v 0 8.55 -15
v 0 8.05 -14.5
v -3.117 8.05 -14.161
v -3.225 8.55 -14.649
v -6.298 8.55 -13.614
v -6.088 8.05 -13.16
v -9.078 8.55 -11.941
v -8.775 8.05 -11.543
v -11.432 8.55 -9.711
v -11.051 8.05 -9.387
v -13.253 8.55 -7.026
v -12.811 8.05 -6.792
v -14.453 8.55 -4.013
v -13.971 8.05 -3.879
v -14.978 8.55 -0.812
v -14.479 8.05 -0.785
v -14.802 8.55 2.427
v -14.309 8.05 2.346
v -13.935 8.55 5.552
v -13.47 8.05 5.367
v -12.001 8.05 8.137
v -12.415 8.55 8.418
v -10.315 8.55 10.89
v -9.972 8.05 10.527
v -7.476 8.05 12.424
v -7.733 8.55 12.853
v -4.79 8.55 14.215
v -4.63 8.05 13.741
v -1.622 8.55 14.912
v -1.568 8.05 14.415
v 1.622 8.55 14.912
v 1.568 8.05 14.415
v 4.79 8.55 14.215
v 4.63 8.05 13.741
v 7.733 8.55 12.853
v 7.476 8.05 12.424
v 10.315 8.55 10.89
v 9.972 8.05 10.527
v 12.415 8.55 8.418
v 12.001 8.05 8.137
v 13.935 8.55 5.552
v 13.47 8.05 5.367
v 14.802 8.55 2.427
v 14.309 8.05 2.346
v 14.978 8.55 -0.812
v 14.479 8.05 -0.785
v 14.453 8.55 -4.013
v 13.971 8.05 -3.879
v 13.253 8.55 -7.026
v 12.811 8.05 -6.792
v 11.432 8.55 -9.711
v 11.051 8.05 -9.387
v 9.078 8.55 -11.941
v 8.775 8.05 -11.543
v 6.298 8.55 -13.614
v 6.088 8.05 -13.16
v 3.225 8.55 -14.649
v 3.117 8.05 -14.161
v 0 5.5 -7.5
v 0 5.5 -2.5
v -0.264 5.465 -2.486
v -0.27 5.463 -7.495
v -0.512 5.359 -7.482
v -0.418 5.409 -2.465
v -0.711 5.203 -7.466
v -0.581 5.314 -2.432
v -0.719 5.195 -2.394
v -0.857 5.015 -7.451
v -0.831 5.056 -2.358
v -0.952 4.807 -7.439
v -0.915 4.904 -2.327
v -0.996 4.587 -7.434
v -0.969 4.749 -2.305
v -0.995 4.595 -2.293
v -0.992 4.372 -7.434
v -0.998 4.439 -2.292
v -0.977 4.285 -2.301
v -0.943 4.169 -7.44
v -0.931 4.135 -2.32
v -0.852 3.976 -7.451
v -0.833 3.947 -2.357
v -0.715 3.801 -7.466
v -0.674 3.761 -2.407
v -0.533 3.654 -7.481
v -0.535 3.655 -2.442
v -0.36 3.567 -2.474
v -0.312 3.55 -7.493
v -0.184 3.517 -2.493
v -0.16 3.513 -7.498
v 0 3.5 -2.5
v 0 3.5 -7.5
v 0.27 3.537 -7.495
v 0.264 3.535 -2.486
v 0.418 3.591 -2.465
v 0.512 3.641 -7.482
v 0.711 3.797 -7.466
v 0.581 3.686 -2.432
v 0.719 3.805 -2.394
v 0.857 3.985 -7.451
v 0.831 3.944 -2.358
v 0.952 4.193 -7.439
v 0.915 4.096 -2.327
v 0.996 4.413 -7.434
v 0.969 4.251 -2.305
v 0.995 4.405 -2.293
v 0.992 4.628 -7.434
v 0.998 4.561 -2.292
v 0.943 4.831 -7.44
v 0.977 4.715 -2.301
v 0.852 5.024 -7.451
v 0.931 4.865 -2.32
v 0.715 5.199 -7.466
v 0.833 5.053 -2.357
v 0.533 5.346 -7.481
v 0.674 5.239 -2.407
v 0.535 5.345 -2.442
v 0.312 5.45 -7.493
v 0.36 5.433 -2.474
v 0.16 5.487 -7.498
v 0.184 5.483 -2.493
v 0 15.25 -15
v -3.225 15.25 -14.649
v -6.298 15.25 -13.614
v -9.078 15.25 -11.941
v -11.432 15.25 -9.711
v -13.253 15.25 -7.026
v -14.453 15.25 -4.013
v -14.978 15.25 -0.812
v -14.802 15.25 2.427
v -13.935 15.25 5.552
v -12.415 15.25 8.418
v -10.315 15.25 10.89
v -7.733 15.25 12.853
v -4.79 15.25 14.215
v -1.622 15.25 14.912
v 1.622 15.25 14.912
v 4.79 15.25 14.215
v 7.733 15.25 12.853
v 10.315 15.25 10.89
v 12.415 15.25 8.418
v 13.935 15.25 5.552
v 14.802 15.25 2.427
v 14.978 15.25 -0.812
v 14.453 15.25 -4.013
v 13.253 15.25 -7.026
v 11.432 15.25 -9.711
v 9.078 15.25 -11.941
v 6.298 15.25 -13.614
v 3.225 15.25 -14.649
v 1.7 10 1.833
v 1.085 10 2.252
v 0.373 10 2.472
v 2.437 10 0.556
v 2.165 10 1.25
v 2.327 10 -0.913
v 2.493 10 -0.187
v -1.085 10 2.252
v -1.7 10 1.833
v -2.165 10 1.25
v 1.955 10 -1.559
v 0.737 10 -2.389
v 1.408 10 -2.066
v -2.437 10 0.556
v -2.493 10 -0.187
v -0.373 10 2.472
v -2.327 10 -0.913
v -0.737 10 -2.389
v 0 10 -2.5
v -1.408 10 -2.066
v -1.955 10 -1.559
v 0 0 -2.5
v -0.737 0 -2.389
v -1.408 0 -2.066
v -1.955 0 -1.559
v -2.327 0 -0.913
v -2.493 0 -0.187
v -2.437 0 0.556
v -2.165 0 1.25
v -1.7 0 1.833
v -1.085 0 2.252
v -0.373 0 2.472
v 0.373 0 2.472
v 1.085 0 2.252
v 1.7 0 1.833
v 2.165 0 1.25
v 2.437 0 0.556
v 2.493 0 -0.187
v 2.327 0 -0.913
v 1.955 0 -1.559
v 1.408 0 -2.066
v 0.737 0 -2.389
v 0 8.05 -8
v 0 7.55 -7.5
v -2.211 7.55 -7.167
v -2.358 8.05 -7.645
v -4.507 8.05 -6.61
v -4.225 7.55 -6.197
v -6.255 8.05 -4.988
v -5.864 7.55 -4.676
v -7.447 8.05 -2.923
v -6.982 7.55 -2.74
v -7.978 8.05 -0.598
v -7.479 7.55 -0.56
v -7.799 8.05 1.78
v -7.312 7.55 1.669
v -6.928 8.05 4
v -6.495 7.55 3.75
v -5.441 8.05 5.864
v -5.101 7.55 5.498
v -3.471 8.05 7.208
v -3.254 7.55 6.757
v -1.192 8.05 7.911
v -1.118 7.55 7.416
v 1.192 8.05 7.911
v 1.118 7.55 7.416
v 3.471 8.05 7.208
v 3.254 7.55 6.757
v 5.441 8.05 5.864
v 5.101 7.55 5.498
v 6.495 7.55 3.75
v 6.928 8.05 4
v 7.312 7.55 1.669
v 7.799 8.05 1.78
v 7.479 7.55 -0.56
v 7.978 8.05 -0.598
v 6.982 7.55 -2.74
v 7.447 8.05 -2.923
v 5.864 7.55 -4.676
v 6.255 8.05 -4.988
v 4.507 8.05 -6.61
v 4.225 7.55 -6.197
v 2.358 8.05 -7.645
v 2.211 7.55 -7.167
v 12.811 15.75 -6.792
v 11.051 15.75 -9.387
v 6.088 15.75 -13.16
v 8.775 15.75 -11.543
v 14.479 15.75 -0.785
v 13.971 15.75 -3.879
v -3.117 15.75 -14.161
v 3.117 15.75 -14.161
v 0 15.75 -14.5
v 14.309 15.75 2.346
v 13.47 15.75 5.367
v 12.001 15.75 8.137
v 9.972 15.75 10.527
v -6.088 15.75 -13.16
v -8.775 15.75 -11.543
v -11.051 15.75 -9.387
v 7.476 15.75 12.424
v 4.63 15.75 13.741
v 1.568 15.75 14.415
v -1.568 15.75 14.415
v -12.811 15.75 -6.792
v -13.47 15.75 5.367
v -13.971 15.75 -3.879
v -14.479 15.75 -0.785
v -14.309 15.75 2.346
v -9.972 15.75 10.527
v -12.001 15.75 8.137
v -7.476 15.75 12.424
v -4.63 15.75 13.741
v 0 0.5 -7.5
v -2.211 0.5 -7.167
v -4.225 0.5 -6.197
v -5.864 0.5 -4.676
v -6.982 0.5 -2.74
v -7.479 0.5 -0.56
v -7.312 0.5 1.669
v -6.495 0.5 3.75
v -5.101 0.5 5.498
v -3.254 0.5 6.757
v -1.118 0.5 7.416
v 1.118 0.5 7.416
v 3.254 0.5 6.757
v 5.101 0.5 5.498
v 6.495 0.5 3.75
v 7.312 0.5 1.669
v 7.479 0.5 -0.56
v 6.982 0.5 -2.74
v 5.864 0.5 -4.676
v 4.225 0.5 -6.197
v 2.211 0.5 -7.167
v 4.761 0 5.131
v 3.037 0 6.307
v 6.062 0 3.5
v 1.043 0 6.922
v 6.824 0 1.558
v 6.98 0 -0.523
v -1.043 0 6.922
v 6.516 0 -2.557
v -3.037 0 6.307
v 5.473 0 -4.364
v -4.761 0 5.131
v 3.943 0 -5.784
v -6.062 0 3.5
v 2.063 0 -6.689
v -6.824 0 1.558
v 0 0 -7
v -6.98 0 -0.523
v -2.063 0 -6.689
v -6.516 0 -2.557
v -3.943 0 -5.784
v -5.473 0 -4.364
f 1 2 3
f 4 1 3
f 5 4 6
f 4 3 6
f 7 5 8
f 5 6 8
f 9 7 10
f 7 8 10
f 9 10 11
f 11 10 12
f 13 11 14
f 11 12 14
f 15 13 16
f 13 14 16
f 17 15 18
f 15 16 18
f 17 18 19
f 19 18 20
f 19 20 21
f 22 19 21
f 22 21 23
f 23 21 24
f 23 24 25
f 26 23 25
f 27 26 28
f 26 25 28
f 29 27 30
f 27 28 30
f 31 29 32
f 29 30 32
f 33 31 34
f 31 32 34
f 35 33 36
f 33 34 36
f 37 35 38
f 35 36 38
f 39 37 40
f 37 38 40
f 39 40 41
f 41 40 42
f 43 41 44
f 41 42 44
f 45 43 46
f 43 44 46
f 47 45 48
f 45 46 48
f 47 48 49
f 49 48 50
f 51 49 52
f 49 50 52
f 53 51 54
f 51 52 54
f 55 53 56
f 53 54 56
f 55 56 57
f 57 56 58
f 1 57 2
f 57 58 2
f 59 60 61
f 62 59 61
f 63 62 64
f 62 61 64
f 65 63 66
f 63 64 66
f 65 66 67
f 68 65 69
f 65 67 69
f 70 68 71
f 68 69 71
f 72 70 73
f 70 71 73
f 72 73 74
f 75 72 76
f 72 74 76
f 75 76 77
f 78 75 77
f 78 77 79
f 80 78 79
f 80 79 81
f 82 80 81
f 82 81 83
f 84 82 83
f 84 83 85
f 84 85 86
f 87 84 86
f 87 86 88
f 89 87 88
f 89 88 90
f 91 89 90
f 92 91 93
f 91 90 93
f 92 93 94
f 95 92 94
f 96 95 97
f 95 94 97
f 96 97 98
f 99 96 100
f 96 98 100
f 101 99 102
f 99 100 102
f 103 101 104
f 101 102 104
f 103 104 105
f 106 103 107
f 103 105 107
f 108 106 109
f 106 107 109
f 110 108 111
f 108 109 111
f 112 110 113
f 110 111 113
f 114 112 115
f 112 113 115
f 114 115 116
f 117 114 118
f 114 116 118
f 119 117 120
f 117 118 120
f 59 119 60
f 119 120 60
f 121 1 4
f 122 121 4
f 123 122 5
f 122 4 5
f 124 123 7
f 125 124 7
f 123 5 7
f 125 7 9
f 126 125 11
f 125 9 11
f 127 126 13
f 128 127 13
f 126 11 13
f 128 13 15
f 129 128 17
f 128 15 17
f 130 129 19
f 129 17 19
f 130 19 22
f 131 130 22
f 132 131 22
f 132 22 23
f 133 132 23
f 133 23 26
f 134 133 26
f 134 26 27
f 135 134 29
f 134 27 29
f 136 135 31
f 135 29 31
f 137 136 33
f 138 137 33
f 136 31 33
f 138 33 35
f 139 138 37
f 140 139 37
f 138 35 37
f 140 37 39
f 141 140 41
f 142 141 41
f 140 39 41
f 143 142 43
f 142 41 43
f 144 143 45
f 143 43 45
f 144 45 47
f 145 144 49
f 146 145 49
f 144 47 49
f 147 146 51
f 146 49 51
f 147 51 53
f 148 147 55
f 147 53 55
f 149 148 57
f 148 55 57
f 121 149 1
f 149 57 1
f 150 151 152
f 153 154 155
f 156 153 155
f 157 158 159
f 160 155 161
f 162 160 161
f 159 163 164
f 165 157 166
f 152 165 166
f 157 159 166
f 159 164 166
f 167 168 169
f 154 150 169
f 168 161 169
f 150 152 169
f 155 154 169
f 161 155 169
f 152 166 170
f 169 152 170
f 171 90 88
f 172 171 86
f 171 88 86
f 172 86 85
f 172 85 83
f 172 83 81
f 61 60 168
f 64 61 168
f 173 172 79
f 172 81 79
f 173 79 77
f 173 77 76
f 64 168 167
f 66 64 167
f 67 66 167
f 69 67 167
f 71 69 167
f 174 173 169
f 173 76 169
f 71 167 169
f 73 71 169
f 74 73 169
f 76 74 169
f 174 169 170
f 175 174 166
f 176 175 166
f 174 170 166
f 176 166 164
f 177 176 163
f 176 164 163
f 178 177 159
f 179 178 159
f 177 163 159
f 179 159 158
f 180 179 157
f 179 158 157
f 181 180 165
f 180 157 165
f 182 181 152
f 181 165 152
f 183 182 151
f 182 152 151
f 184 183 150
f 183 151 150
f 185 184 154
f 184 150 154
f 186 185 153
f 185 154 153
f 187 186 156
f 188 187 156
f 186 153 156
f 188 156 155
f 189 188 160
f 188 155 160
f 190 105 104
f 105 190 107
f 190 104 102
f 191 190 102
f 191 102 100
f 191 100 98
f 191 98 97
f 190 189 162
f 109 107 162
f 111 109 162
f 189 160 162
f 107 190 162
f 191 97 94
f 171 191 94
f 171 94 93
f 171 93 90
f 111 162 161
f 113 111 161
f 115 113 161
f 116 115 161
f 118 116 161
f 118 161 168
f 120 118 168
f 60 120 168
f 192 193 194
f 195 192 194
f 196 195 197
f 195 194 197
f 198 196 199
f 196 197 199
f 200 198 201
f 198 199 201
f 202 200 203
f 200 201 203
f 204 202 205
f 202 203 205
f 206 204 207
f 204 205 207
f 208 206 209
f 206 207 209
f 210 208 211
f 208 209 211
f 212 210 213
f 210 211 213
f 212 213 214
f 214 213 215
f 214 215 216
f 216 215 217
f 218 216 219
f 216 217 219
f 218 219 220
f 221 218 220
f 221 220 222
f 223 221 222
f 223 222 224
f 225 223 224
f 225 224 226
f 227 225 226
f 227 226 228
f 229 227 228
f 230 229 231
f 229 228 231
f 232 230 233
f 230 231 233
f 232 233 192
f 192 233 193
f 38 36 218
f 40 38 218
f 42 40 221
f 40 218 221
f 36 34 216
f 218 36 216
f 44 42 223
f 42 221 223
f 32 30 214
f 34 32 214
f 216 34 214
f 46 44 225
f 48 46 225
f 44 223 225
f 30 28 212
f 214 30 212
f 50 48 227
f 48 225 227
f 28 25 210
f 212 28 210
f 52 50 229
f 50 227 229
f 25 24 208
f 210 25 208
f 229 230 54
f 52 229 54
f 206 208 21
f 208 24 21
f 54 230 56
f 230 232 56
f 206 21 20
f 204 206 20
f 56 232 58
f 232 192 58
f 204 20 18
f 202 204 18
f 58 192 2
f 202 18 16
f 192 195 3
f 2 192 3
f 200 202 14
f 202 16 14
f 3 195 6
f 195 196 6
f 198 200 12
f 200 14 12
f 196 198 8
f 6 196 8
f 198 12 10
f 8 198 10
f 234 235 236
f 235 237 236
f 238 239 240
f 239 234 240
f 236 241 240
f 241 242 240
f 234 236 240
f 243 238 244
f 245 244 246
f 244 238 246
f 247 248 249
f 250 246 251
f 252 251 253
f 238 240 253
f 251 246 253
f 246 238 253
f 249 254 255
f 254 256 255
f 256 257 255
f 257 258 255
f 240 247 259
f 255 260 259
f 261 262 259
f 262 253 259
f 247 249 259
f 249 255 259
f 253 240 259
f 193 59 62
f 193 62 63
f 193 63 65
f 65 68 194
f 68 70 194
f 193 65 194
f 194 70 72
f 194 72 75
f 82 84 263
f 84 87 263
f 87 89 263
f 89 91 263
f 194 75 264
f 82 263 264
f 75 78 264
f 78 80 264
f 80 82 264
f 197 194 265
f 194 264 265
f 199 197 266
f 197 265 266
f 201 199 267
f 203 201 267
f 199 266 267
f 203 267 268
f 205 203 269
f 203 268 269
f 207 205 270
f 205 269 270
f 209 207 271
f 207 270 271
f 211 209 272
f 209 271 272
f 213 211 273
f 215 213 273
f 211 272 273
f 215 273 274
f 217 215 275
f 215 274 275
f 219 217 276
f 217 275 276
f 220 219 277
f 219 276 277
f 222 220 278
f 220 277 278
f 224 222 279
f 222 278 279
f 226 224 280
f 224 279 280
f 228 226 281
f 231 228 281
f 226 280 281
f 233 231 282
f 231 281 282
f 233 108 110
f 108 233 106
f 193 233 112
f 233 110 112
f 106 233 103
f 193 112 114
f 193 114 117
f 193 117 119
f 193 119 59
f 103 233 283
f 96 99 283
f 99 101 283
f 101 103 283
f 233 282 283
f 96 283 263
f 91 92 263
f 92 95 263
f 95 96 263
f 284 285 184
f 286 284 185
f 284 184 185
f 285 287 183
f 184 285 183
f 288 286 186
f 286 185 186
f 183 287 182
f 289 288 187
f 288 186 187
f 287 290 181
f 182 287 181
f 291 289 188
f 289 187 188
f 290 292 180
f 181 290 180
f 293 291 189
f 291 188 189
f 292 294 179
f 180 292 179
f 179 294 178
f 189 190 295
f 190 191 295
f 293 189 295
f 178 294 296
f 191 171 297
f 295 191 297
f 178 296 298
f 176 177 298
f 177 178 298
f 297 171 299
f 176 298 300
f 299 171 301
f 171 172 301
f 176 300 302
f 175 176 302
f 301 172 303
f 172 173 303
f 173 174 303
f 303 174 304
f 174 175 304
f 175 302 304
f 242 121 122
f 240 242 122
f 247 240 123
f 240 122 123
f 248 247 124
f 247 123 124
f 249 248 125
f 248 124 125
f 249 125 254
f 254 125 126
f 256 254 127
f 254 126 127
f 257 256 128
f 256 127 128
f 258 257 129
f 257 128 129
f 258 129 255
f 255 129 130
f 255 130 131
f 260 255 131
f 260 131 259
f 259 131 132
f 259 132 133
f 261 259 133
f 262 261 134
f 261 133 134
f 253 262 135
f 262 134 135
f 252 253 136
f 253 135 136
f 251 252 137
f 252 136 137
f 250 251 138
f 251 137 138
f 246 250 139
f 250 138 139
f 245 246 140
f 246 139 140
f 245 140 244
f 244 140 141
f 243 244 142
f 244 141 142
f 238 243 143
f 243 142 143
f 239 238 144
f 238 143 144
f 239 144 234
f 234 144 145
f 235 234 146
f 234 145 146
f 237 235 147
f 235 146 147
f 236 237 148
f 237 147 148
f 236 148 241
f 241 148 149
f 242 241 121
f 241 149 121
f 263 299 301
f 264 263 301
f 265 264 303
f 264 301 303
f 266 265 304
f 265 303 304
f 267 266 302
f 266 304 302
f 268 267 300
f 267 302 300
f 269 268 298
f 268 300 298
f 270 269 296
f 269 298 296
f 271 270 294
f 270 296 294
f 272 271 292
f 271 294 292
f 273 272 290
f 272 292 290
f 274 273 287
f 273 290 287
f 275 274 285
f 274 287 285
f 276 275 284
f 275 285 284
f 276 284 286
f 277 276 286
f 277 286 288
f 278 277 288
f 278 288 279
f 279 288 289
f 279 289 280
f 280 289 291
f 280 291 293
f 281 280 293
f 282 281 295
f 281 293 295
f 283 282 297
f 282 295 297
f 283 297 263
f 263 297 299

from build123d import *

# Parameters (mm, degrees)
CHAMFER1_SIZE      = 0.5
SKETCH2_R          = 1
CUT_EXTRUDE1_DEPTH = 27.420872431


with BuildPart() as part:
    # Sketch1 → Revolve1 (revolve)
    with BuildSketch(Plane.XY):
        Polygon((0, 15.75), (-15, 15.75), (-15, 8.05), (-7.5, 8.05), (-7.5, 0), (-2.5, 0), (-2.5, 10), (0, 10), align=None)
    revolve(axis=Axis((0, 0, 0), (0, 1, 0)))

    # Chamfer1
    chamfer1_edges = [part.edges().sort_by_distance(p)[0] for p in [
        (7.5, 0, 0),
        (7.5, 8.05, 0),
        (15, 8.05, 0),
        (15, 15.75, 0),
    ]]
    chamfer(chamfer1_edges, length=CHAMFER1_SIZE)

    # Sketch2 → Cut-Extrude1 (cut, through all)
    with BuildSketch(Plane.XY):
        with Locations((0, 4.5)):
            Circle(SKETCH2_R)
    extrude(amount=-CUT_EXTRUDE1_DEPTH, mode=Mode.SUBTRACT)


solid = part.part
